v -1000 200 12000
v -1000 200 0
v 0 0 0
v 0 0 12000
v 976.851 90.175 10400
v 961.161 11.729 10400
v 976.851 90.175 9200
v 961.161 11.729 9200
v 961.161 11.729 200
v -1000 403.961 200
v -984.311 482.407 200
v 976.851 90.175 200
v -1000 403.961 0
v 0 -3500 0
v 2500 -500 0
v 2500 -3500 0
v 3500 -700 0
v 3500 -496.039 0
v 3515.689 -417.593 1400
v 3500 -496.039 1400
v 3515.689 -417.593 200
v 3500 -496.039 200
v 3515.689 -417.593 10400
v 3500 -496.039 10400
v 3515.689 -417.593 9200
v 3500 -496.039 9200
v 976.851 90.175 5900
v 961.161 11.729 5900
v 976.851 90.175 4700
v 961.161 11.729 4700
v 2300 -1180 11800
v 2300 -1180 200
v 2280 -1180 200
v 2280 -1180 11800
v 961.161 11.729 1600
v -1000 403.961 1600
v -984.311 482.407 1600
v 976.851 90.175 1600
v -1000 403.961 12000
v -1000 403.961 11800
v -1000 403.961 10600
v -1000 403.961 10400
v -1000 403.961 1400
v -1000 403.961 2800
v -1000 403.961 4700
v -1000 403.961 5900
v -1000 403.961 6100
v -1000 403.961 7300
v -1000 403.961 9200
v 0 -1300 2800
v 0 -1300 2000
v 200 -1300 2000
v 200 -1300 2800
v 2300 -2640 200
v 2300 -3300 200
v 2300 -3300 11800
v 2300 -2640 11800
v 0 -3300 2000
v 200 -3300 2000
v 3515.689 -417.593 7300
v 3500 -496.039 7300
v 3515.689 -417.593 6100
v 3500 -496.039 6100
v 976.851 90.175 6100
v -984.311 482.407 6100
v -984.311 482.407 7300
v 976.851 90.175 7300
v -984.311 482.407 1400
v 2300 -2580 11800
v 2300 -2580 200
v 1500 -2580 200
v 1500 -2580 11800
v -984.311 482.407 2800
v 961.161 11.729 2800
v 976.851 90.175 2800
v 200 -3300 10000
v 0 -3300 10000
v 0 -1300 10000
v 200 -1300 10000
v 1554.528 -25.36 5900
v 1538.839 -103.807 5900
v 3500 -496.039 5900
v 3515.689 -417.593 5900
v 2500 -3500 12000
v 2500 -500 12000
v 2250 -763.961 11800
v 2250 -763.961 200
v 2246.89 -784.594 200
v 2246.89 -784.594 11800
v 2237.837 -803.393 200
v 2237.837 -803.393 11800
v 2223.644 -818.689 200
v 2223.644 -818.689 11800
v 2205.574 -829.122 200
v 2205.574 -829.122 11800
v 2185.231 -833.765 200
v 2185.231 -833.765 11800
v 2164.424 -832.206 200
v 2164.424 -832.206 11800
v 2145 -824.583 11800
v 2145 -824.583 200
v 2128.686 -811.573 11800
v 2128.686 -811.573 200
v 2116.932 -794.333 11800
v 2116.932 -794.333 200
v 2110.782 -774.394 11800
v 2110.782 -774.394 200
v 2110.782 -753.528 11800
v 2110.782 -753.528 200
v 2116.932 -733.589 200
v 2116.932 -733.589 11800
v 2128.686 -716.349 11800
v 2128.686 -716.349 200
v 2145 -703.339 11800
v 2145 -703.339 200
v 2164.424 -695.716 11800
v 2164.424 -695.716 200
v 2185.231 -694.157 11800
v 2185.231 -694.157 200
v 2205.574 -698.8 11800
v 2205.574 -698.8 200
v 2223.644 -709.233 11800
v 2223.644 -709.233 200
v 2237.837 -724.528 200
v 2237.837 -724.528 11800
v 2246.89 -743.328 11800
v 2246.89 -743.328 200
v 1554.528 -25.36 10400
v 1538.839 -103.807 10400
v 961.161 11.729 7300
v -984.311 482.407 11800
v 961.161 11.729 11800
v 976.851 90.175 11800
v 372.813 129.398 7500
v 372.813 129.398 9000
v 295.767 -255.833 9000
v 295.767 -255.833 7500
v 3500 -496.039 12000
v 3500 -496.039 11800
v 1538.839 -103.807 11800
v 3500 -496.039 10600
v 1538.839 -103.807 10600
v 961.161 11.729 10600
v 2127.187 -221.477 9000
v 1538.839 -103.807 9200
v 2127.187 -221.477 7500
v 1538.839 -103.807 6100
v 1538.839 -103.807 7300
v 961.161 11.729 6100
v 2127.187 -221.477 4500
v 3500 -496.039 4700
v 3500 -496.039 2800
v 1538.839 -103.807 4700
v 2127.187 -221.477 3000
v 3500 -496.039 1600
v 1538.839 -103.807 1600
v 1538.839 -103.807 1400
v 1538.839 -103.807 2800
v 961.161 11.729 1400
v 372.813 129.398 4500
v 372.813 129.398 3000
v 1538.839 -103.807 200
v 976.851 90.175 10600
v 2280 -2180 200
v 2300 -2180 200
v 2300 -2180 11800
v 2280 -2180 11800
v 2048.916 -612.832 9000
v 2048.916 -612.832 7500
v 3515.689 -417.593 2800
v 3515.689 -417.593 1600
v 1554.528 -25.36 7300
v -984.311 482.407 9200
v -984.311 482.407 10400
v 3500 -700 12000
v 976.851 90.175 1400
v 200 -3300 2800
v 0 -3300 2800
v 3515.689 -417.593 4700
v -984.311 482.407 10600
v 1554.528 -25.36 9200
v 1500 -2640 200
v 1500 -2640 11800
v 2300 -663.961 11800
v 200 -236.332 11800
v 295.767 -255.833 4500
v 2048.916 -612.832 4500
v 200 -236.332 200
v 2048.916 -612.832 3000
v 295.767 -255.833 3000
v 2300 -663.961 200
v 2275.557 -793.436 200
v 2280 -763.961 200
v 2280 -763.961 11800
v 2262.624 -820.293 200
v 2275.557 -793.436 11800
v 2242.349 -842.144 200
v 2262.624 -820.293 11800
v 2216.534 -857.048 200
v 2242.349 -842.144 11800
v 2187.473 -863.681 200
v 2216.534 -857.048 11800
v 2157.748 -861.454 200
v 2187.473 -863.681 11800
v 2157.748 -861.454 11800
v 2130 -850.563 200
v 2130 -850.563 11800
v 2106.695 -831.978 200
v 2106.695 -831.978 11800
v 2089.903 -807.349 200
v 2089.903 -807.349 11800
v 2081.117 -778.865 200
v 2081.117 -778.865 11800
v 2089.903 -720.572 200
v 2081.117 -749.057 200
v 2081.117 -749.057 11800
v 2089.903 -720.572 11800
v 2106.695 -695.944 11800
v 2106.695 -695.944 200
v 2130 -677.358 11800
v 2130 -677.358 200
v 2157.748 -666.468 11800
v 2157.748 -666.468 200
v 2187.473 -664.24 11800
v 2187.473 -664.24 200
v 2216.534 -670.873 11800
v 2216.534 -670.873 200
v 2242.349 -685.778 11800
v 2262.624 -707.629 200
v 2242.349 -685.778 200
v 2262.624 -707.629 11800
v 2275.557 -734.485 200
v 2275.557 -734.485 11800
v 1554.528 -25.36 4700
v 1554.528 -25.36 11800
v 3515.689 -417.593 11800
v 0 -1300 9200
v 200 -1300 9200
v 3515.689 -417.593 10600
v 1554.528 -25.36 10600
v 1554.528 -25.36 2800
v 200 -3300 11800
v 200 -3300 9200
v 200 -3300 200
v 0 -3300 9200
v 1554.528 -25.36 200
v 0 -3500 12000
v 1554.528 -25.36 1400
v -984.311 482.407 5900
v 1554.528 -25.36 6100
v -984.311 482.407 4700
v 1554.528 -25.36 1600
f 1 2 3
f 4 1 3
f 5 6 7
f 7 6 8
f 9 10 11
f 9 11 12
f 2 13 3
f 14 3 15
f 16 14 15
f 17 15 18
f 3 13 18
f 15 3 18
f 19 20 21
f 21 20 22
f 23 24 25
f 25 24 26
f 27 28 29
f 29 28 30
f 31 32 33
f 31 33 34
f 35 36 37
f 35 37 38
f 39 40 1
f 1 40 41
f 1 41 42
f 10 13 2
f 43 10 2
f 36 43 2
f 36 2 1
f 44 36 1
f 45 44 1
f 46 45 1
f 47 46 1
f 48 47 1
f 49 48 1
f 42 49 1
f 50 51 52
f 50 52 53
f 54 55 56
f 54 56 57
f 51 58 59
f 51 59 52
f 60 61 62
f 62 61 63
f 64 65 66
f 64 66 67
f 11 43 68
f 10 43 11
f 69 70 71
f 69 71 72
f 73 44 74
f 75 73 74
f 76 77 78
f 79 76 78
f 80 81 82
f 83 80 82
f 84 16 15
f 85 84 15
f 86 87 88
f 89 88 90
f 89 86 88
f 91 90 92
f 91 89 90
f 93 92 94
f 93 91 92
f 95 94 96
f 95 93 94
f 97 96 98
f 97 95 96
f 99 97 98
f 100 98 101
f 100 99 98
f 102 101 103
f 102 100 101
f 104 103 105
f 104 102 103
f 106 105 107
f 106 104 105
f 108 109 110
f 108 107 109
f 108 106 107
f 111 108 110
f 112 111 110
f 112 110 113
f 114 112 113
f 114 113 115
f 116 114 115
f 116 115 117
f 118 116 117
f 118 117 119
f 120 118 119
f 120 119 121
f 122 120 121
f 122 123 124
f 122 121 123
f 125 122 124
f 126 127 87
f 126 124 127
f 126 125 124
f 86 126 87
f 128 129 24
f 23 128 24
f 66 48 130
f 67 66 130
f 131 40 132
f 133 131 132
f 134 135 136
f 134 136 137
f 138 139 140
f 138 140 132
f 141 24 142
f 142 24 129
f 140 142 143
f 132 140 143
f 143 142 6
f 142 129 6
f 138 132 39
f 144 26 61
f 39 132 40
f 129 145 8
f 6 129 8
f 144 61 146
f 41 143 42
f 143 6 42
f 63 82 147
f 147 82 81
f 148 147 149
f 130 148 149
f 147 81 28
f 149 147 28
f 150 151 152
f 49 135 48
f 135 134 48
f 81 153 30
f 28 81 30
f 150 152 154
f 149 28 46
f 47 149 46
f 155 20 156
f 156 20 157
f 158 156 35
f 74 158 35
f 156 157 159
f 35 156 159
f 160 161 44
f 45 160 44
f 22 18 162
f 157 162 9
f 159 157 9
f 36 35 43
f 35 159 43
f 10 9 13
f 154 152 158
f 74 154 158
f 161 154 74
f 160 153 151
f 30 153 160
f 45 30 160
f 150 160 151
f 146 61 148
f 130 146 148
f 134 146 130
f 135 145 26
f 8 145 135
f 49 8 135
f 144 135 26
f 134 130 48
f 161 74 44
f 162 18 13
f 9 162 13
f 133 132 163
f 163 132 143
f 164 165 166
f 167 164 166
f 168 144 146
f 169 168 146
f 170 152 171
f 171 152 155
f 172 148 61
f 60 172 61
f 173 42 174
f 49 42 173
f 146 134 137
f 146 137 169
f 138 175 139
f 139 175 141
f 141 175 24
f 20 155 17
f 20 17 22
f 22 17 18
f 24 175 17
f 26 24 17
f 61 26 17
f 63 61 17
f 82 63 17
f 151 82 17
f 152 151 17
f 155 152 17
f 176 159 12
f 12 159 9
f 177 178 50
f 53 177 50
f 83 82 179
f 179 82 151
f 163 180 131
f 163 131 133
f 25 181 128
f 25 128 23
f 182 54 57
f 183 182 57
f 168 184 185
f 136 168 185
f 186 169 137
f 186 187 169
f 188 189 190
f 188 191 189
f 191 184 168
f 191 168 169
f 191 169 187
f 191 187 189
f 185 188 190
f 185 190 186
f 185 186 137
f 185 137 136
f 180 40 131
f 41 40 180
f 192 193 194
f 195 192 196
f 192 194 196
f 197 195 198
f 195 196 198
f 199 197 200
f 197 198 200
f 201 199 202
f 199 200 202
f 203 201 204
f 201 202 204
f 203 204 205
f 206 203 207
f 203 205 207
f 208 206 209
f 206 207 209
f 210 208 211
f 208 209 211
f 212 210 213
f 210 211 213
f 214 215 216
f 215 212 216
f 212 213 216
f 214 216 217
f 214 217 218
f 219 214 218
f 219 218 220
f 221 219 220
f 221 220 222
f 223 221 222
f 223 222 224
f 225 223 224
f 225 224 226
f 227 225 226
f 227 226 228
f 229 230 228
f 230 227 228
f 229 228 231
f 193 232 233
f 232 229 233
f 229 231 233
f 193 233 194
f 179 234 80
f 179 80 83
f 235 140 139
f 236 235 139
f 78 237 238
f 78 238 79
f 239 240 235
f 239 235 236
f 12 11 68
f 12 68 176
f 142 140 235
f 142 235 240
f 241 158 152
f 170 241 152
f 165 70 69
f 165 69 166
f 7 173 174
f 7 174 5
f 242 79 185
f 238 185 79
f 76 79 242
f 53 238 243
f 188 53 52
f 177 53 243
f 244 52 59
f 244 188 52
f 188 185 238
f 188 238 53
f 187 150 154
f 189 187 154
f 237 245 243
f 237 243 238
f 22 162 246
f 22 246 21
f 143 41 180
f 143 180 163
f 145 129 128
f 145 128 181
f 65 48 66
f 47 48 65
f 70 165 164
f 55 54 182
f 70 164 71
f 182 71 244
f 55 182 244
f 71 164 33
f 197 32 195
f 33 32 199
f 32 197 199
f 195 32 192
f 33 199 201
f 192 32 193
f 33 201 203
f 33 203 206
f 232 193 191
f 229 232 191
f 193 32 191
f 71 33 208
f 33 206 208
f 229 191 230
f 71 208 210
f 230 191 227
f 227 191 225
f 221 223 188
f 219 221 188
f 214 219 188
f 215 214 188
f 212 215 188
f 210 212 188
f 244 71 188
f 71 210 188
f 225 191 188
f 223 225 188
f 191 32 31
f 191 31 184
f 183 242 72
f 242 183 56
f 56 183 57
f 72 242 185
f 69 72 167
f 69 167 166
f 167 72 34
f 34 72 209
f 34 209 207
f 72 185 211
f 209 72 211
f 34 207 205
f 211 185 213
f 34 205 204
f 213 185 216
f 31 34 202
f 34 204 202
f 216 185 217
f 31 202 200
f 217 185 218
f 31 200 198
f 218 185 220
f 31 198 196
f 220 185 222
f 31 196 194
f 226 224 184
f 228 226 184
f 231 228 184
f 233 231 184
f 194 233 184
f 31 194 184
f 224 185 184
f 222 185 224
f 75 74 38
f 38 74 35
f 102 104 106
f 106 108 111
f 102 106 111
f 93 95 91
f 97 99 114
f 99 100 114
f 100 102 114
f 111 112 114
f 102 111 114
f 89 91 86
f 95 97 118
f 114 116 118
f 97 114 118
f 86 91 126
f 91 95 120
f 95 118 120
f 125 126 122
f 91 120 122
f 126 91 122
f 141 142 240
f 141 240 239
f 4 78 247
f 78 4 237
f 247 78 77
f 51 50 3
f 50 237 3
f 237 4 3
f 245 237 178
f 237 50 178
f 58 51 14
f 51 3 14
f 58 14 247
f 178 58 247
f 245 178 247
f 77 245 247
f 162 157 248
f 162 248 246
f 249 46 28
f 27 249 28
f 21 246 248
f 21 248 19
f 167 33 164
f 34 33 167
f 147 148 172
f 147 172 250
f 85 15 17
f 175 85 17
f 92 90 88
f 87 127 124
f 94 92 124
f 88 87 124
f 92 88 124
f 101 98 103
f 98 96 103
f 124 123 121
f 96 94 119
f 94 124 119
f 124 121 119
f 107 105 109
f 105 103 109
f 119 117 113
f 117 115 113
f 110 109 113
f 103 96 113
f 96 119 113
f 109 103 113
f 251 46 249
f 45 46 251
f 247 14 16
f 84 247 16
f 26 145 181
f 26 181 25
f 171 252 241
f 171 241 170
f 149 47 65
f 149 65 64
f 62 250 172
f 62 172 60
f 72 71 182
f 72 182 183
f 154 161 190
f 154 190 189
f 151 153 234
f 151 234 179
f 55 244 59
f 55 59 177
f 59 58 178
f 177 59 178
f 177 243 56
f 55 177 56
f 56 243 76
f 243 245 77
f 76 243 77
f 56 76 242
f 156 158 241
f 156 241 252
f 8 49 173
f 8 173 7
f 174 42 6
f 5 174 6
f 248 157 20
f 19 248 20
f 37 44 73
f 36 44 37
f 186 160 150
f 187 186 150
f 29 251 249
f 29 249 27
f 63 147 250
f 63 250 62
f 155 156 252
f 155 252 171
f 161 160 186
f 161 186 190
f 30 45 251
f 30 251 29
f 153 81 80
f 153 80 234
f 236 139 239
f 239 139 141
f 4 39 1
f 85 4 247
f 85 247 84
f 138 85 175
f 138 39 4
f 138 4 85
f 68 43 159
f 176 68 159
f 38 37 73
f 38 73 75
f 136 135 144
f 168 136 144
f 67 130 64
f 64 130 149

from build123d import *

# Parameters (mm, degrees)
BOSS_EXTRUDE1_DEPTH = 12000
SKETCH2_W           = 2000
SKETCH2_H           = 1200
BOSS_EXTRUDE2_DEPTH = 80
SKETCH3_W           = 1789.117562234
SKETCH3_H           = 1500
CUT_EXTRUDE1_DEPTH  = 400
BOSS_EXTRUDE3_DEPTH = 200
BOSS_EXTRUDE4_DEPTH = 200
SKETCH6_W           = 800
SKETCH6_H           = 2000
CUT_EXTRUDE2_DEPTH  = 200
SKETCH7_W           = 11600
SKETCH7_H           = 60
BOSS_EXTRUDE5_DEPTH = 800
SKETCH8_R           = 100
SKETCH8_R_2         = 70
BOSS_EXTRUDE7_DEPTH = 11721
SKETCH9_W           = 11600
SKETCH9_H           = 1000
BOSS_EXTRUDE8_DEPTH = 20


with BuildPart() as part:
    # Sketch1 → Boss-Extrude1 (new body)
    with BuildSketch(Plane.XY):
        Polygon((2500, -3500), (2500, -500), (0, 0), (0, -3500), align=None)
        Polygon((2300, -663.960780544), (200, -236.33182537), (200, -3300), (2300, -3300), align=None, mode=Mode.SUBTRACT)
        Polygon((-1000, 200), (0, 0), (2500, -500), (3500, -700), (3500, -496.039219456), (-1000, 403.960780544), align=None)
    extrude(amount=BOSS_EXTRUDE1_DEPTH)

    # Sketch2 → Boss-Extrude2 (add)
    with BuildSketch(Plane(origin=(39.223227028, 196.116135138, 0), x_dir=(0.9805806756909202, -0.19611613513818382, 0), z_dir=(0.19611613513818382, 0.9805806756909203, 0))):
        with Locations((-59.803902719, -11200)):
            Rectangle(SKETCH2_W, SKETCH2_H)
        with Locations((2529.313659515, -11200)):
            Rectangle(SKETCH2_W, SKETCH2_H)
        with Locations((-59.803902719, -9800)):
            Rectangle(SKETCH2_W, SKETCH2_H)
        with Locations((2529.313659515, -9800)):
            Rectangle(SKETCH2_W, SKETCH2_H)
        with Locations((-59.803902719, -6700)):
            Rectangle(SKETCH2_W, SKETCH2_H)
        with Locations((2529.313659515, -6700)):
            Rectangle(SKETCH2_W, SKETCH2_H)
        with Locations((-59.803902719, -800)):
            Rectangle(SKETCH2_W, SKETCH2_H)
        with Locations((2529.313659515, -800)):
            Rectangle(SKETCH2_W, SKETCH2_H)
        with Locations((-59.803902719, -2200)):
            Rectangle(SKETCH2_W, SKETCH2_H)
        with Locations((-59.803902719, -5300)):
            Rectangle(SKETCH2_W, SKETCH2_H)
        with Locations((2529.313659515, -2200)):
            Rectangle(SKETCH2_W, SKETCH2_H)
        with Locations((2529.313659515, -5300)):
            Rectangle(SKETCH2_W, SKETCH2_H)
    extrude(amount=BOSS_EXTRUDE2_DEPTH)

    # Sketch3 → Cut-Extrude1 (cut)
    with BuildSketch(Plane(origin=(39.223227028, 196.116135138, 0), x_dir=(0.9805806756909202, -0.19611613513818382, 0), z_dir=(0.19611613513818382, 0.9805806756909203, 0))):
        with Locations((1234.754878398, -8250)):
            Rectangle(SKETCH3_W, SKETCH3_H)
        with Locations((1234.754878398, -3750)):
            Rectangle(SKETCH3_W, SKETCH3_H)
    extrude(amount=-CUT_EXTRUDE1_DEPTH, mode=Mode.SUBTRACT)

    # Sketch4 → Boss-Extrude3 (add)
    with BuildSketch(Plane.XY.offset(12000)):
        Polygon((2500, -3500), (2500, -500), (3500, -700), (3500, -496.039219456), (-1000, 403.960780544), (-1000, 200), (0, 0), (0, -3500), align=None)
    extrude(amount=-BOSS_EXTRUDE3_DEPTH)

    # Sketch5 → Boss-Extrude4 (add)
    with BuildSketch(Plane(origin=(0, 0, 0), x_dir=(-1, 0, 0), z_dir=(0, 0, -1))):
        Polygon((-2500, -500), (-2500, -3500), (0, -3500), (0, 0), (1000, 200), (1000, 403.960780544), (-3500, -496.039219456), (-3500, -700), align=None)
    extrude(amount=-BOSS_EXTRUDE4_DEPTH)

    # Sketch6 → Cut-Extrude2 (cut)
    with BuildSketch(Plane.ZY):
        with Locations((2400, -2300)):
            Rectangle(SKETCH6_W, SKETCH6_H)
        with Locations((9600, -2300)):
            Rectangle(SKETCH6_W, SKETCH6_H)
    extrude(amount=-CUT_EXTRUDE2_DEPTH, mode=Mode.SUBTRACT)

    # Sketch7 → Boss-Extrude5 (add)
    with BuildSketch(Plane.ZY.offset(-2300)):
        with Locations((6000, -2610)):
            Rectangle(SKETCH7_W, SKETCH7_H)
    extrude(amount=BOSS_EXTRUDE5_DEPTH)

    # Sketch8 → Boss-Extrude7 (add)
    with BuildSketch(Plane(origin=(0, 0, 11800), x_dir=(-1, 0, 0), z_dir=(0, 0, -1))):
        with Locations(Location((-2180, -763.960780544, 0), (0, 0, 180))):
            Circle(SKETCH8_R)
        with Locations(Location((-2180, -763.960780544, 0), (0, 0, 180))):
            Circle(SKETCH8_R_2, mode=Mode.SUBTRACT)
    extrude(amount=BOSS_EXTRUDE7_DEPTH)

    # Sketch9 → Boss-Extrude8 (add)
    with BuildSketch(Plane.ZY.offset(-2300)):
        with Locations((6000, -1680)):
            Rectangle(SKETCH9_W, SKETCH9_H)
    extrude(amount=BOSS_EXTRUDE8_DEPTH)


solid = part.part
